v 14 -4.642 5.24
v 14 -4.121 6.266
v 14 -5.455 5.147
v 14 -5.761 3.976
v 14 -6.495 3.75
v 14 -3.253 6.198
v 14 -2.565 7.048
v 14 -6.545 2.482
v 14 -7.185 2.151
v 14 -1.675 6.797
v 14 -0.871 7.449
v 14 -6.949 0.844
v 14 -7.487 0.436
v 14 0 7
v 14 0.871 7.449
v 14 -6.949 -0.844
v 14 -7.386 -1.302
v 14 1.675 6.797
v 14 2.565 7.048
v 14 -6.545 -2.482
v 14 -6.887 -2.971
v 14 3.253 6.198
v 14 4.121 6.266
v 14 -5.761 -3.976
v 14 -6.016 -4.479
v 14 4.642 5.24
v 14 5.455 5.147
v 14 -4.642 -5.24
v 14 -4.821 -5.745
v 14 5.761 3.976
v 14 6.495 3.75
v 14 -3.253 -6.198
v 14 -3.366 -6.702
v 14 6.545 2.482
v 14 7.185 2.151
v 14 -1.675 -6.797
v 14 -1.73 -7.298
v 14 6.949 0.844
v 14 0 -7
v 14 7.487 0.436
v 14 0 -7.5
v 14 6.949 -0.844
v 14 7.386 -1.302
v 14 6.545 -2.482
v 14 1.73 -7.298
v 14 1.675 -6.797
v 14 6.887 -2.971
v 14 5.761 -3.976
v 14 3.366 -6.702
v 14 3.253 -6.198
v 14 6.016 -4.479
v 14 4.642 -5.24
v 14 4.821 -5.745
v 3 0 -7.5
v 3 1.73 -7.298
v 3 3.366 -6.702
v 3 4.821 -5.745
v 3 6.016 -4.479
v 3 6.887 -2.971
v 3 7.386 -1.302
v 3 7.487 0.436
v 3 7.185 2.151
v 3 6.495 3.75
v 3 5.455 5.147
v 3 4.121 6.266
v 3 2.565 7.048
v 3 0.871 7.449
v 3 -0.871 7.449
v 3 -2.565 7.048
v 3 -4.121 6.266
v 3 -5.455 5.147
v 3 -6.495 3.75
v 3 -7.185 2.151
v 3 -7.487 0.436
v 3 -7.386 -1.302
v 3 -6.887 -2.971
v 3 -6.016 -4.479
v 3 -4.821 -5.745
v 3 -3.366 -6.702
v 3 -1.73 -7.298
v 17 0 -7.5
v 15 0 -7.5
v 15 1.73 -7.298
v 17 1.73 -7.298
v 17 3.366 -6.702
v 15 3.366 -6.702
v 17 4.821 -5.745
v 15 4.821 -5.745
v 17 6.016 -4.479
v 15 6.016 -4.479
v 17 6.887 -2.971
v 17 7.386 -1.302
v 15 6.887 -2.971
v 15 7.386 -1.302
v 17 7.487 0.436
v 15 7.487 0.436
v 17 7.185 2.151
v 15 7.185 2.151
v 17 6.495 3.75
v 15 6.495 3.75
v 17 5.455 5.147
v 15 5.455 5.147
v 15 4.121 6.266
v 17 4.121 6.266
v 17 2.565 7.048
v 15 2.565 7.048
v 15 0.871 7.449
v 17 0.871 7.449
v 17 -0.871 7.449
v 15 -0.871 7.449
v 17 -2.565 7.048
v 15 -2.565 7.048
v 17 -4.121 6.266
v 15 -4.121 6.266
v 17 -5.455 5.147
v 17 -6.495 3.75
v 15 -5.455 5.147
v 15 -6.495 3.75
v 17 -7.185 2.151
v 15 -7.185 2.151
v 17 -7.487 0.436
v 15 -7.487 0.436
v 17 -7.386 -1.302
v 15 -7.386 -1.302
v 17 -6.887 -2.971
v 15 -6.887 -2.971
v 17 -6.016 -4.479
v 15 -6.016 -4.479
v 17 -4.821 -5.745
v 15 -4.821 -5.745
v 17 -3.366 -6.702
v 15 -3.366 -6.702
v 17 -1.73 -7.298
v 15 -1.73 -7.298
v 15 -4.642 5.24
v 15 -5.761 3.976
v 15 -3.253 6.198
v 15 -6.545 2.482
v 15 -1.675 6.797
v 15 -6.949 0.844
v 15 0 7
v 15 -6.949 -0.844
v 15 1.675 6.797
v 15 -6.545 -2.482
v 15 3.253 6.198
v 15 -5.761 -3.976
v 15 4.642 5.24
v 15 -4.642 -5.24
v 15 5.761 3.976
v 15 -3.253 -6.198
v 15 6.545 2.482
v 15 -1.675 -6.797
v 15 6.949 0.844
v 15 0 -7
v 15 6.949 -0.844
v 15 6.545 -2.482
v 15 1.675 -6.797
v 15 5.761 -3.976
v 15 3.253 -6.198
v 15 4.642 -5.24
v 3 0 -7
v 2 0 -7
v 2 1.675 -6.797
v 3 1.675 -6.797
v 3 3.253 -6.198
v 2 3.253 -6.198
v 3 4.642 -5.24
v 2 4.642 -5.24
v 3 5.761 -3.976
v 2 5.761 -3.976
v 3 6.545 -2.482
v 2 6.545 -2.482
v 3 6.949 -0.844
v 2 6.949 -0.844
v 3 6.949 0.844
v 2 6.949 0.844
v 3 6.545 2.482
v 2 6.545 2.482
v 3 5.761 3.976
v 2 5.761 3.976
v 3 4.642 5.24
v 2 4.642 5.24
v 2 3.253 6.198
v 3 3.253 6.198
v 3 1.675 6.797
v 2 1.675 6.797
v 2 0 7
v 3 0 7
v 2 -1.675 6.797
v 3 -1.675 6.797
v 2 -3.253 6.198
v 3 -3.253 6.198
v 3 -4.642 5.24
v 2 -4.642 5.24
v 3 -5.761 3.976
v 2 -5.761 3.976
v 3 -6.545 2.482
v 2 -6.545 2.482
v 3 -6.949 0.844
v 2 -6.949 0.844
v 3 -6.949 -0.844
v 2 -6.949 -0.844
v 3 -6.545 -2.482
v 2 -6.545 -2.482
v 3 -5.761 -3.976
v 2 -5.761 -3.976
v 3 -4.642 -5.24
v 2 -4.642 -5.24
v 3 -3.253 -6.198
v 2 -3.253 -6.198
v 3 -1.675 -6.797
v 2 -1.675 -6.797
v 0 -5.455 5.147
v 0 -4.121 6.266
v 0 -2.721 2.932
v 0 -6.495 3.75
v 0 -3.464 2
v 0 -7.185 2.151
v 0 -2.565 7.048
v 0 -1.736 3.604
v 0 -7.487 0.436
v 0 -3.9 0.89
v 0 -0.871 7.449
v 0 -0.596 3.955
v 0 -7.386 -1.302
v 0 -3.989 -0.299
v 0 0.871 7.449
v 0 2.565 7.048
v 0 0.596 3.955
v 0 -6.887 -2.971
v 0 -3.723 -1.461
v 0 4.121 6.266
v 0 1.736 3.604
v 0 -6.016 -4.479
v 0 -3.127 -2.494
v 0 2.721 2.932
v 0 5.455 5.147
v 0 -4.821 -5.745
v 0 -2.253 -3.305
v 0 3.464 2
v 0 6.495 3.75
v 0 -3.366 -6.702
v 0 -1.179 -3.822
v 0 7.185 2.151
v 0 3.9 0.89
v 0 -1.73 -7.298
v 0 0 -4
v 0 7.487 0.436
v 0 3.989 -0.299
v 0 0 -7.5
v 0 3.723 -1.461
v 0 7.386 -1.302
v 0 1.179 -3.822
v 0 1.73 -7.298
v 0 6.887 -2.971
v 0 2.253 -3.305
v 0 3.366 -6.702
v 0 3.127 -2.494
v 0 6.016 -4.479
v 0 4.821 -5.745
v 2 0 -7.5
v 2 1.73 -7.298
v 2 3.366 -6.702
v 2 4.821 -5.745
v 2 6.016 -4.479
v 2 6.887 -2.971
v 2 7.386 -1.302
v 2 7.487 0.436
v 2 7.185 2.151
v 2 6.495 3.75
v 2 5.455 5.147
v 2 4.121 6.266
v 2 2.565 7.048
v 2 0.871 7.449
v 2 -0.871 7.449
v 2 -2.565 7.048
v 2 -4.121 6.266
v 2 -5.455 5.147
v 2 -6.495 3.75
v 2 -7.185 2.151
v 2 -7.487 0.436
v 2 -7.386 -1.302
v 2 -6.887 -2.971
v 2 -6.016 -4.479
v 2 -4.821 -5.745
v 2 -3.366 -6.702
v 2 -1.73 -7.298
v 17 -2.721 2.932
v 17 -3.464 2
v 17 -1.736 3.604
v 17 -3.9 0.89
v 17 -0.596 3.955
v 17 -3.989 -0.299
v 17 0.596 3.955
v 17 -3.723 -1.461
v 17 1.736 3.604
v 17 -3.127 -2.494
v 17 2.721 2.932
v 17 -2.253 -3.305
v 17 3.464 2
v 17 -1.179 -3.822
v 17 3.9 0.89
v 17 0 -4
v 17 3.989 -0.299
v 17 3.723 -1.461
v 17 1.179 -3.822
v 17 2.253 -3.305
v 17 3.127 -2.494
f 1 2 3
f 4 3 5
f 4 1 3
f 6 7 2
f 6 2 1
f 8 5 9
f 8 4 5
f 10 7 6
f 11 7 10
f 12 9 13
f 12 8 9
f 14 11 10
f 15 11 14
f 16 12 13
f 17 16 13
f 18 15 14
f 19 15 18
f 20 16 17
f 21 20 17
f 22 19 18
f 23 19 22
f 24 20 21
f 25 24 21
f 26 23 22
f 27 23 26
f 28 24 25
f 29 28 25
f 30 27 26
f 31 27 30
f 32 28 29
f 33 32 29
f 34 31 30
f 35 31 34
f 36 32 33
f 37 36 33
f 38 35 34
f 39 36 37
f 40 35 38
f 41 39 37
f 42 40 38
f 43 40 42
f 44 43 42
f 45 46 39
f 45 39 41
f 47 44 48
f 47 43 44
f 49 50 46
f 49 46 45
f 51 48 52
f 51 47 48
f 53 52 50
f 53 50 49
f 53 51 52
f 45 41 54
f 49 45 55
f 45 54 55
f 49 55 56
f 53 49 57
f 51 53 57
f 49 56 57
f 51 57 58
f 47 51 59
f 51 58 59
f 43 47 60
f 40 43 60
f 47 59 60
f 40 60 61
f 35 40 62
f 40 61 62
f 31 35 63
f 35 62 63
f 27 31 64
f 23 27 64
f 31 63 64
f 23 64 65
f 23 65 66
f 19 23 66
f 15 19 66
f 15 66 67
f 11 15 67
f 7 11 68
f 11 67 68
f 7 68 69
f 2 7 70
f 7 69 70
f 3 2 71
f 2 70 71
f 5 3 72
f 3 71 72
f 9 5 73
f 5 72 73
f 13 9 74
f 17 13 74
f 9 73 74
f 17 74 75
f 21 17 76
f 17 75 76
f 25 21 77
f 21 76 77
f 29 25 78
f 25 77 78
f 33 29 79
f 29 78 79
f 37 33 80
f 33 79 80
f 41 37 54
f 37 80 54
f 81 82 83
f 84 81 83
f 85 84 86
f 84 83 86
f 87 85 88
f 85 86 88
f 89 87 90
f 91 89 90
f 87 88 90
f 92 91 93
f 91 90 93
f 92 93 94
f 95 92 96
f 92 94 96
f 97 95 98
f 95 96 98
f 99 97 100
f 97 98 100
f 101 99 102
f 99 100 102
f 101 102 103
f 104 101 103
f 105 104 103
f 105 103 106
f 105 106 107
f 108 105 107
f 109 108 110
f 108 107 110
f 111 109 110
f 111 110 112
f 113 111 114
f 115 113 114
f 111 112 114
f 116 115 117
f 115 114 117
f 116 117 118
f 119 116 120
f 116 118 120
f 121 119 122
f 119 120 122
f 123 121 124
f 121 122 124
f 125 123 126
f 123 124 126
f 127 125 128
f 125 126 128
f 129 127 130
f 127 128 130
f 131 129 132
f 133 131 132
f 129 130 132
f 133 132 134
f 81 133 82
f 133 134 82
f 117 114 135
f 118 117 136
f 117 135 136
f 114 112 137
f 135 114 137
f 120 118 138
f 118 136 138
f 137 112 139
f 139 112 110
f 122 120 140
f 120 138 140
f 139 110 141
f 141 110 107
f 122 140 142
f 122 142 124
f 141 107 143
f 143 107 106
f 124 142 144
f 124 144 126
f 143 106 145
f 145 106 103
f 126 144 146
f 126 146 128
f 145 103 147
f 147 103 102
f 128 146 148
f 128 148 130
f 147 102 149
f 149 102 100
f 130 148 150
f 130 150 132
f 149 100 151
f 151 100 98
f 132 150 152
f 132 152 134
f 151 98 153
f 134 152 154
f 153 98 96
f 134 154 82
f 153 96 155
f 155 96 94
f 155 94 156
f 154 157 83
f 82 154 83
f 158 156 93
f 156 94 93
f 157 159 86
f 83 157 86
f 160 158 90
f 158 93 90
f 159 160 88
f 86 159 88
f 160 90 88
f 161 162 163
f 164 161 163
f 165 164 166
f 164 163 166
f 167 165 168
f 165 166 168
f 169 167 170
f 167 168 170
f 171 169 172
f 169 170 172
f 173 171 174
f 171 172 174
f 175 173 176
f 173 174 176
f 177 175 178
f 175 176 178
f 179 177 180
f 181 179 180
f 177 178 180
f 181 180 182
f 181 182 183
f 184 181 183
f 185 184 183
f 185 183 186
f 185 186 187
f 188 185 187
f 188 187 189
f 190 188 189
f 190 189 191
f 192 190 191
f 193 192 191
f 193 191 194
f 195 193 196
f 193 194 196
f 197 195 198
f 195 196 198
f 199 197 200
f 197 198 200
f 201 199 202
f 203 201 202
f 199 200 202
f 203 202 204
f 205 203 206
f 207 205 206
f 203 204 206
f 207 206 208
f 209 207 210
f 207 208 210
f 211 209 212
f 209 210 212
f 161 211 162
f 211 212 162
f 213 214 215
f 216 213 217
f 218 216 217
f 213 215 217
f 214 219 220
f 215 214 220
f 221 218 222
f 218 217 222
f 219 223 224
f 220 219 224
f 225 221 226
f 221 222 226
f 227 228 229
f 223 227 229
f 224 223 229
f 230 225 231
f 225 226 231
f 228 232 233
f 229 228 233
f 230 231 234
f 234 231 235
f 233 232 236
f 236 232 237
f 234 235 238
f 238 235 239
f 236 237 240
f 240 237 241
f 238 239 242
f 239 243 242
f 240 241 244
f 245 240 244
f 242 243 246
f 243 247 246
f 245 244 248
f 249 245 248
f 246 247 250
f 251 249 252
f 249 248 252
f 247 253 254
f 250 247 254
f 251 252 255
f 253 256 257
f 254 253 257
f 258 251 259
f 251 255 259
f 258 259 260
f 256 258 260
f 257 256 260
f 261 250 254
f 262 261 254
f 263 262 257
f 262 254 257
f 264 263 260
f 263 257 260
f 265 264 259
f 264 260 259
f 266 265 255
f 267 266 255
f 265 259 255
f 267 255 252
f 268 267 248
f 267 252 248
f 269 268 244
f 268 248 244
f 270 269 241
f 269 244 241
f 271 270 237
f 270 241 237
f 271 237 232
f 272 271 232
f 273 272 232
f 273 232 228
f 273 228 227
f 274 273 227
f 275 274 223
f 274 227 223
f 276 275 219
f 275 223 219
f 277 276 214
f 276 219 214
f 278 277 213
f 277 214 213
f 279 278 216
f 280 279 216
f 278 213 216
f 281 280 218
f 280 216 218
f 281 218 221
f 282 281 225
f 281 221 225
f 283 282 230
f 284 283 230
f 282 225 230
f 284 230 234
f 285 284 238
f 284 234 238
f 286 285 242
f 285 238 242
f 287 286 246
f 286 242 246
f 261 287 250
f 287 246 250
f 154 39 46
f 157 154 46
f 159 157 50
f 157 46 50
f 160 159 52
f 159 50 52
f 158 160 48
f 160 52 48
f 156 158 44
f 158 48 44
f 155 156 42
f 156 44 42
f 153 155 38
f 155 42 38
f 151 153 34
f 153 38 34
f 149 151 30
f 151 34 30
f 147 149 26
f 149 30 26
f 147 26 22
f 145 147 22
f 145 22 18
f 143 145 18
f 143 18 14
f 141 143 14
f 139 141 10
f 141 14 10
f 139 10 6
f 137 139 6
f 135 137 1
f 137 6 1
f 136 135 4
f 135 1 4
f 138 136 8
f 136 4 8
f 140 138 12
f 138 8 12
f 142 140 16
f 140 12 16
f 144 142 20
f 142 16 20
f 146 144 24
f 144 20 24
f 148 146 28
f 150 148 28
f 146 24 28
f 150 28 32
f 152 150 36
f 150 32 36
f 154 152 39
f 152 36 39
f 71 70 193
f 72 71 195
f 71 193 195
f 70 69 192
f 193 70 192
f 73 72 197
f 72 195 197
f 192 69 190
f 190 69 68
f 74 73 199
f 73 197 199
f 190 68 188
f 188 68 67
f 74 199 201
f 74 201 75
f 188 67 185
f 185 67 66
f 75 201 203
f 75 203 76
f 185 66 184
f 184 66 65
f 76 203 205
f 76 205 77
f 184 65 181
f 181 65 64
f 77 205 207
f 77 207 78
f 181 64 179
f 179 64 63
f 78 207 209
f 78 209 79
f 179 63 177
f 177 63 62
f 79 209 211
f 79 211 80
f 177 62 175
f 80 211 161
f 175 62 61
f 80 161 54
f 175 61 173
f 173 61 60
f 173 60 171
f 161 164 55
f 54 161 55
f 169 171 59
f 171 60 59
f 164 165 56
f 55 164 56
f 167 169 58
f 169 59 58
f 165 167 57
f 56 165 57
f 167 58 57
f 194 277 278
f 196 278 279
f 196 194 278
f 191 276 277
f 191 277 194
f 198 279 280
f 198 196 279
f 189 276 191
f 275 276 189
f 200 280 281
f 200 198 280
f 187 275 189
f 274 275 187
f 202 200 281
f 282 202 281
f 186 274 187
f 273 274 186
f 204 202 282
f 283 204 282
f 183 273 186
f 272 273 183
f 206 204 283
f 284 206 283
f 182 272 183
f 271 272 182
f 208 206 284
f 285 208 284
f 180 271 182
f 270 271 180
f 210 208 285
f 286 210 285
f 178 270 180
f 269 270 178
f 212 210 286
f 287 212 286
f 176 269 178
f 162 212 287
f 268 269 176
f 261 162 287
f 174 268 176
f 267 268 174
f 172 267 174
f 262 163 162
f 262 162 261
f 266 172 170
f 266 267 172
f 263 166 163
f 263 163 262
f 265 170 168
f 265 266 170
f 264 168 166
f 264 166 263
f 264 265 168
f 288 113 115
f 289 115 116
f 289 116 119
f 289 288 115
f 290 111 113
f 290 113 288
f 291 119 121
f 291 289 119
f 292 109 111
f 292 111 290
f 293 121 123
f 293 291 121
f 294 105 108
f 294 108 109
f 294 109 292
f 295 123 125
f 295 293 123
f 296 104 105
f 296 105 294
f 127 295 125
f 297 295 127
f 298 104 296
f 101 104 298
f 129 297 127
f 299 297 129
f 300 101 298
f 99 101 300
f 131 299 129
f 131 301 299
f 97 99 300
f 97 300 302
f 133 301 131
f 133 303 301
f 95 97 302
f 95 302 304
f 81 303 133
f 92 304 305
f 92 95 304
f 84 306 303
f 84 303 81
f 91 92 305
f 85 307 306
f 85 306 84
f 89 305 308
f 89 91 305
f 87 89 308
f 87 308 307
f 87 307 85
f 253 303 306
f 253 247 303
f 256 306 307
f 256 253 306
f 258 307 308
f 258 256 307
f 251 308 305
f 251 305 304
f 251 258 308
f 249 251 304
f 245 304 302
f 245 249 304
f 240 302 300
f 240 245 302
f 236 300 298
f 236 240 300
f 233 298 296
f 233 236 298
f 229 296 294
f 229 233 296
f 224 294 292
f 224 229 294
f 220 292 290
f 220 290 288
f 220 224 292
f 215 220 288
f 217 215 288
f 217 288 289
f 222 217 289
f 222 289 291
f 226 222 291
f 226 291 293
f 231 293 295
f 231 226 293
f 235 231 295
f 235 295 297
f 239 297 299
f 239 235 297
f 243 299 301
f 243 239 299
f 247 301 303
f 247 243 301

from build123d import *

# Parameters (mm, degrees)
SKETCH1_R           = 7.5
SKETCH1_R_2         = 4
BOSS_EXTRUDE1_DEPTH = 2
SKETCH2_R           = 7
SKETCH2_R_2         = 4
BOSS_EXTRUDE2_DEPTH = 1
SKETCH3_R           = 7.5
SKETCH3_R_2         = 4
BOSS_EXTRUDE3_DEPTH = 11
SKETCH4_R           = 7
SKETCH4_R_2         = 4
BOSS_EXTRUDE4_DEPTH = 1
SKETCH5_R           = 7.5
SKETCH5_R_2         = 4
BOSS_EXTRUDE5_DEPTH = 2


with BuildPart() as part:
    # Sketch1 → Boss-Extrude1 (new body)
    with BuildSketch(Plane(origin=(0, 0, 0), x_dir=(0, 0, -1), z_dir=(1, 0, 0))):
        Circle(SKETCH1_R)
        Circle(SKETCH1_R_2, mode=Mode.SUBTRACT)
    extrude(amount=BOSS_EXTRUDE1_DEPTH)

    # Sketch2 → Boss-Extrude2 (add)
    with BuildSketch(Plane(origin=(2, 0, 0), x_dir=(0, 0, -1), z_dir=(1, 0, 0))):
        Circle(SKETCH2_R)
        Circle(SKETCH2_R_2, mode=Mode.SUBTRACT)
    extrude(amount=BOSS_EXTRUDE2_DEPTH)

    # Sketch3 → Boss-Extrude3 (add)
    with BuildSketch(Plane(origin=(3, 0, 0), x_dir=(0, 0, -1), z_dir=(1, 0, 0))):
        Circle(SKETCH3_R)
        Circle(SKETCH3_R_2, mode=Mode.SUBTRACT)
    extrude(amount=BOSS_EXTRUDE3_DEPTH)

    # Sketch4 → Boss-Extrude4 (add)
    with BuildSketch(Plane(origin=(14, 0, 0), x_dir=(0, 0, -1), z_dir=(1, 0, 0))):
        Circle(SKETCH4_R)
        Circle(SKETCH4_R_2, mode=Mode.SUBTRACT)
    extrude(amount=BOSS_EXTRUDE4_DEPTH)

    # Sketch5 → Boss-Extrude5 (add)
    with BuildSketch(Plane(origin=(15, 0, 0), x_dir=(0, 0, -1), z_dir=(1, 0, 0))):
        Circle(SKETCH5_R)
        Circle(SKETCH5_R_2, mode=Mode.SUBTRACT)
    extrude(amount=BOSS_EXTRUDE5_DEPTH)


solid = part.part
